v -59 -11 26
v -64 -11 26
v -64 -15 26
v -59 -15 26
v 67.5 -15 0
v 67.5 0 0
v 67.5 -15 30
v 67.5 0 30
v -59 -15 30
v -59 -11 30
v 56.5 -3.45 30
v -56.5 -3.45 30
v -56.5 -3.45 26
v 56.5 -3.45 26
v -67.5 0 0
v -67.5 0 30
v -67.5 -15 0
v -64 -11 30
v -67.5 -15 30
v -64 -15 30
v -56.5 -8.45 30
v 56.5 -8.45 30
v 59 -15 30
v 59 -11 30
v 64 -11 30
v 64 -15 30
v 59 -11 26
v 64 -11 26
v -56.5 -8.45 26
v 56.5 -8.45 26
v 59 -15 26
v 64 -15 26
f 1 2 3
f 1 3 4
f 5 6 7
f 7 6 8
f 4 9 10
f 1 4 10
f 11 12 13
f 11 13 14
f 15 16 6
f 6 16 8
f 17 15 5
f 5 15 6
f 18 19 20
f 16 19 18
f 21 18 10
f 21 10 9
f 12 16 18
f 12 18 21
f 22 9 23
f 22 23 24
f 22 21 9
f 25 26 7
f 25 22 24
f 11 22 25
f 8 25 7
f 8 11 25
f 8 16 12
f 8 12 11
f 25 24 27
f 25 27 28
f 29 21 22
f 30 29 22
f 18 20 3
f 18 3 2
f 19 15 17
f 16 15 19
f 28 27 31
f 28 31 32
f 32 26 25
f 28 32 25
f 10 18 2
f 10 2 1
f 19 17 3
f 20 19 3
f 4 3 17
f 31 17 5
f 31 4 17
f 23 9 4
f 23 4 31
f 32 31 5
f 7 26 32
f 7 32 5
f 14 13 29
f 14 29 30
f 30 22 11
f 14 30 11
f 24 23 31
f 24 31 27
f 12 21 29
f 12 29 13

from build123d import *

# Parameters (mm, degrees)
F0_W     = 135
F0_H     = 30
F1_DEPTH = 15
F2_W     = 113
F2_H     = 5
F3_DEPTH = 4
F4_W     = 5
F4_H     = 4
F5_DEPTH = 4


with BuildPart() as f1:
    # F0 (on Front) → F1 (new body)
    with BuildSketch(Plane.XZ):
        with Locations((0, 15)):
            Rectangle(F0_W, F0_H)
    extrude(amount=F1_DEPTH)

    # F2 (on face) → F3 (cut)
    with BuildSketch(Plane.XY.offset(30)):
        with Locations((0, -5.95)):
            Rectangle(F2_W, F2_H)
    extrude(amount=-F3_DEPTH, mode=Mode.SUBTRACT)

    # F4 (on face) → F5 (cut)
    with BuildSketch(Plane.XY.offset(30)):
        with Locations((61.5, -13)):
            Rectangle(F4_W, F4_H)
        with Locations((-61.5, -13)):
            Rectangle(F4_W, F4_H)
    extrude(amount=-F5_DEPTH, mode=Mode.SUBTRACT)


solid = f1.part
